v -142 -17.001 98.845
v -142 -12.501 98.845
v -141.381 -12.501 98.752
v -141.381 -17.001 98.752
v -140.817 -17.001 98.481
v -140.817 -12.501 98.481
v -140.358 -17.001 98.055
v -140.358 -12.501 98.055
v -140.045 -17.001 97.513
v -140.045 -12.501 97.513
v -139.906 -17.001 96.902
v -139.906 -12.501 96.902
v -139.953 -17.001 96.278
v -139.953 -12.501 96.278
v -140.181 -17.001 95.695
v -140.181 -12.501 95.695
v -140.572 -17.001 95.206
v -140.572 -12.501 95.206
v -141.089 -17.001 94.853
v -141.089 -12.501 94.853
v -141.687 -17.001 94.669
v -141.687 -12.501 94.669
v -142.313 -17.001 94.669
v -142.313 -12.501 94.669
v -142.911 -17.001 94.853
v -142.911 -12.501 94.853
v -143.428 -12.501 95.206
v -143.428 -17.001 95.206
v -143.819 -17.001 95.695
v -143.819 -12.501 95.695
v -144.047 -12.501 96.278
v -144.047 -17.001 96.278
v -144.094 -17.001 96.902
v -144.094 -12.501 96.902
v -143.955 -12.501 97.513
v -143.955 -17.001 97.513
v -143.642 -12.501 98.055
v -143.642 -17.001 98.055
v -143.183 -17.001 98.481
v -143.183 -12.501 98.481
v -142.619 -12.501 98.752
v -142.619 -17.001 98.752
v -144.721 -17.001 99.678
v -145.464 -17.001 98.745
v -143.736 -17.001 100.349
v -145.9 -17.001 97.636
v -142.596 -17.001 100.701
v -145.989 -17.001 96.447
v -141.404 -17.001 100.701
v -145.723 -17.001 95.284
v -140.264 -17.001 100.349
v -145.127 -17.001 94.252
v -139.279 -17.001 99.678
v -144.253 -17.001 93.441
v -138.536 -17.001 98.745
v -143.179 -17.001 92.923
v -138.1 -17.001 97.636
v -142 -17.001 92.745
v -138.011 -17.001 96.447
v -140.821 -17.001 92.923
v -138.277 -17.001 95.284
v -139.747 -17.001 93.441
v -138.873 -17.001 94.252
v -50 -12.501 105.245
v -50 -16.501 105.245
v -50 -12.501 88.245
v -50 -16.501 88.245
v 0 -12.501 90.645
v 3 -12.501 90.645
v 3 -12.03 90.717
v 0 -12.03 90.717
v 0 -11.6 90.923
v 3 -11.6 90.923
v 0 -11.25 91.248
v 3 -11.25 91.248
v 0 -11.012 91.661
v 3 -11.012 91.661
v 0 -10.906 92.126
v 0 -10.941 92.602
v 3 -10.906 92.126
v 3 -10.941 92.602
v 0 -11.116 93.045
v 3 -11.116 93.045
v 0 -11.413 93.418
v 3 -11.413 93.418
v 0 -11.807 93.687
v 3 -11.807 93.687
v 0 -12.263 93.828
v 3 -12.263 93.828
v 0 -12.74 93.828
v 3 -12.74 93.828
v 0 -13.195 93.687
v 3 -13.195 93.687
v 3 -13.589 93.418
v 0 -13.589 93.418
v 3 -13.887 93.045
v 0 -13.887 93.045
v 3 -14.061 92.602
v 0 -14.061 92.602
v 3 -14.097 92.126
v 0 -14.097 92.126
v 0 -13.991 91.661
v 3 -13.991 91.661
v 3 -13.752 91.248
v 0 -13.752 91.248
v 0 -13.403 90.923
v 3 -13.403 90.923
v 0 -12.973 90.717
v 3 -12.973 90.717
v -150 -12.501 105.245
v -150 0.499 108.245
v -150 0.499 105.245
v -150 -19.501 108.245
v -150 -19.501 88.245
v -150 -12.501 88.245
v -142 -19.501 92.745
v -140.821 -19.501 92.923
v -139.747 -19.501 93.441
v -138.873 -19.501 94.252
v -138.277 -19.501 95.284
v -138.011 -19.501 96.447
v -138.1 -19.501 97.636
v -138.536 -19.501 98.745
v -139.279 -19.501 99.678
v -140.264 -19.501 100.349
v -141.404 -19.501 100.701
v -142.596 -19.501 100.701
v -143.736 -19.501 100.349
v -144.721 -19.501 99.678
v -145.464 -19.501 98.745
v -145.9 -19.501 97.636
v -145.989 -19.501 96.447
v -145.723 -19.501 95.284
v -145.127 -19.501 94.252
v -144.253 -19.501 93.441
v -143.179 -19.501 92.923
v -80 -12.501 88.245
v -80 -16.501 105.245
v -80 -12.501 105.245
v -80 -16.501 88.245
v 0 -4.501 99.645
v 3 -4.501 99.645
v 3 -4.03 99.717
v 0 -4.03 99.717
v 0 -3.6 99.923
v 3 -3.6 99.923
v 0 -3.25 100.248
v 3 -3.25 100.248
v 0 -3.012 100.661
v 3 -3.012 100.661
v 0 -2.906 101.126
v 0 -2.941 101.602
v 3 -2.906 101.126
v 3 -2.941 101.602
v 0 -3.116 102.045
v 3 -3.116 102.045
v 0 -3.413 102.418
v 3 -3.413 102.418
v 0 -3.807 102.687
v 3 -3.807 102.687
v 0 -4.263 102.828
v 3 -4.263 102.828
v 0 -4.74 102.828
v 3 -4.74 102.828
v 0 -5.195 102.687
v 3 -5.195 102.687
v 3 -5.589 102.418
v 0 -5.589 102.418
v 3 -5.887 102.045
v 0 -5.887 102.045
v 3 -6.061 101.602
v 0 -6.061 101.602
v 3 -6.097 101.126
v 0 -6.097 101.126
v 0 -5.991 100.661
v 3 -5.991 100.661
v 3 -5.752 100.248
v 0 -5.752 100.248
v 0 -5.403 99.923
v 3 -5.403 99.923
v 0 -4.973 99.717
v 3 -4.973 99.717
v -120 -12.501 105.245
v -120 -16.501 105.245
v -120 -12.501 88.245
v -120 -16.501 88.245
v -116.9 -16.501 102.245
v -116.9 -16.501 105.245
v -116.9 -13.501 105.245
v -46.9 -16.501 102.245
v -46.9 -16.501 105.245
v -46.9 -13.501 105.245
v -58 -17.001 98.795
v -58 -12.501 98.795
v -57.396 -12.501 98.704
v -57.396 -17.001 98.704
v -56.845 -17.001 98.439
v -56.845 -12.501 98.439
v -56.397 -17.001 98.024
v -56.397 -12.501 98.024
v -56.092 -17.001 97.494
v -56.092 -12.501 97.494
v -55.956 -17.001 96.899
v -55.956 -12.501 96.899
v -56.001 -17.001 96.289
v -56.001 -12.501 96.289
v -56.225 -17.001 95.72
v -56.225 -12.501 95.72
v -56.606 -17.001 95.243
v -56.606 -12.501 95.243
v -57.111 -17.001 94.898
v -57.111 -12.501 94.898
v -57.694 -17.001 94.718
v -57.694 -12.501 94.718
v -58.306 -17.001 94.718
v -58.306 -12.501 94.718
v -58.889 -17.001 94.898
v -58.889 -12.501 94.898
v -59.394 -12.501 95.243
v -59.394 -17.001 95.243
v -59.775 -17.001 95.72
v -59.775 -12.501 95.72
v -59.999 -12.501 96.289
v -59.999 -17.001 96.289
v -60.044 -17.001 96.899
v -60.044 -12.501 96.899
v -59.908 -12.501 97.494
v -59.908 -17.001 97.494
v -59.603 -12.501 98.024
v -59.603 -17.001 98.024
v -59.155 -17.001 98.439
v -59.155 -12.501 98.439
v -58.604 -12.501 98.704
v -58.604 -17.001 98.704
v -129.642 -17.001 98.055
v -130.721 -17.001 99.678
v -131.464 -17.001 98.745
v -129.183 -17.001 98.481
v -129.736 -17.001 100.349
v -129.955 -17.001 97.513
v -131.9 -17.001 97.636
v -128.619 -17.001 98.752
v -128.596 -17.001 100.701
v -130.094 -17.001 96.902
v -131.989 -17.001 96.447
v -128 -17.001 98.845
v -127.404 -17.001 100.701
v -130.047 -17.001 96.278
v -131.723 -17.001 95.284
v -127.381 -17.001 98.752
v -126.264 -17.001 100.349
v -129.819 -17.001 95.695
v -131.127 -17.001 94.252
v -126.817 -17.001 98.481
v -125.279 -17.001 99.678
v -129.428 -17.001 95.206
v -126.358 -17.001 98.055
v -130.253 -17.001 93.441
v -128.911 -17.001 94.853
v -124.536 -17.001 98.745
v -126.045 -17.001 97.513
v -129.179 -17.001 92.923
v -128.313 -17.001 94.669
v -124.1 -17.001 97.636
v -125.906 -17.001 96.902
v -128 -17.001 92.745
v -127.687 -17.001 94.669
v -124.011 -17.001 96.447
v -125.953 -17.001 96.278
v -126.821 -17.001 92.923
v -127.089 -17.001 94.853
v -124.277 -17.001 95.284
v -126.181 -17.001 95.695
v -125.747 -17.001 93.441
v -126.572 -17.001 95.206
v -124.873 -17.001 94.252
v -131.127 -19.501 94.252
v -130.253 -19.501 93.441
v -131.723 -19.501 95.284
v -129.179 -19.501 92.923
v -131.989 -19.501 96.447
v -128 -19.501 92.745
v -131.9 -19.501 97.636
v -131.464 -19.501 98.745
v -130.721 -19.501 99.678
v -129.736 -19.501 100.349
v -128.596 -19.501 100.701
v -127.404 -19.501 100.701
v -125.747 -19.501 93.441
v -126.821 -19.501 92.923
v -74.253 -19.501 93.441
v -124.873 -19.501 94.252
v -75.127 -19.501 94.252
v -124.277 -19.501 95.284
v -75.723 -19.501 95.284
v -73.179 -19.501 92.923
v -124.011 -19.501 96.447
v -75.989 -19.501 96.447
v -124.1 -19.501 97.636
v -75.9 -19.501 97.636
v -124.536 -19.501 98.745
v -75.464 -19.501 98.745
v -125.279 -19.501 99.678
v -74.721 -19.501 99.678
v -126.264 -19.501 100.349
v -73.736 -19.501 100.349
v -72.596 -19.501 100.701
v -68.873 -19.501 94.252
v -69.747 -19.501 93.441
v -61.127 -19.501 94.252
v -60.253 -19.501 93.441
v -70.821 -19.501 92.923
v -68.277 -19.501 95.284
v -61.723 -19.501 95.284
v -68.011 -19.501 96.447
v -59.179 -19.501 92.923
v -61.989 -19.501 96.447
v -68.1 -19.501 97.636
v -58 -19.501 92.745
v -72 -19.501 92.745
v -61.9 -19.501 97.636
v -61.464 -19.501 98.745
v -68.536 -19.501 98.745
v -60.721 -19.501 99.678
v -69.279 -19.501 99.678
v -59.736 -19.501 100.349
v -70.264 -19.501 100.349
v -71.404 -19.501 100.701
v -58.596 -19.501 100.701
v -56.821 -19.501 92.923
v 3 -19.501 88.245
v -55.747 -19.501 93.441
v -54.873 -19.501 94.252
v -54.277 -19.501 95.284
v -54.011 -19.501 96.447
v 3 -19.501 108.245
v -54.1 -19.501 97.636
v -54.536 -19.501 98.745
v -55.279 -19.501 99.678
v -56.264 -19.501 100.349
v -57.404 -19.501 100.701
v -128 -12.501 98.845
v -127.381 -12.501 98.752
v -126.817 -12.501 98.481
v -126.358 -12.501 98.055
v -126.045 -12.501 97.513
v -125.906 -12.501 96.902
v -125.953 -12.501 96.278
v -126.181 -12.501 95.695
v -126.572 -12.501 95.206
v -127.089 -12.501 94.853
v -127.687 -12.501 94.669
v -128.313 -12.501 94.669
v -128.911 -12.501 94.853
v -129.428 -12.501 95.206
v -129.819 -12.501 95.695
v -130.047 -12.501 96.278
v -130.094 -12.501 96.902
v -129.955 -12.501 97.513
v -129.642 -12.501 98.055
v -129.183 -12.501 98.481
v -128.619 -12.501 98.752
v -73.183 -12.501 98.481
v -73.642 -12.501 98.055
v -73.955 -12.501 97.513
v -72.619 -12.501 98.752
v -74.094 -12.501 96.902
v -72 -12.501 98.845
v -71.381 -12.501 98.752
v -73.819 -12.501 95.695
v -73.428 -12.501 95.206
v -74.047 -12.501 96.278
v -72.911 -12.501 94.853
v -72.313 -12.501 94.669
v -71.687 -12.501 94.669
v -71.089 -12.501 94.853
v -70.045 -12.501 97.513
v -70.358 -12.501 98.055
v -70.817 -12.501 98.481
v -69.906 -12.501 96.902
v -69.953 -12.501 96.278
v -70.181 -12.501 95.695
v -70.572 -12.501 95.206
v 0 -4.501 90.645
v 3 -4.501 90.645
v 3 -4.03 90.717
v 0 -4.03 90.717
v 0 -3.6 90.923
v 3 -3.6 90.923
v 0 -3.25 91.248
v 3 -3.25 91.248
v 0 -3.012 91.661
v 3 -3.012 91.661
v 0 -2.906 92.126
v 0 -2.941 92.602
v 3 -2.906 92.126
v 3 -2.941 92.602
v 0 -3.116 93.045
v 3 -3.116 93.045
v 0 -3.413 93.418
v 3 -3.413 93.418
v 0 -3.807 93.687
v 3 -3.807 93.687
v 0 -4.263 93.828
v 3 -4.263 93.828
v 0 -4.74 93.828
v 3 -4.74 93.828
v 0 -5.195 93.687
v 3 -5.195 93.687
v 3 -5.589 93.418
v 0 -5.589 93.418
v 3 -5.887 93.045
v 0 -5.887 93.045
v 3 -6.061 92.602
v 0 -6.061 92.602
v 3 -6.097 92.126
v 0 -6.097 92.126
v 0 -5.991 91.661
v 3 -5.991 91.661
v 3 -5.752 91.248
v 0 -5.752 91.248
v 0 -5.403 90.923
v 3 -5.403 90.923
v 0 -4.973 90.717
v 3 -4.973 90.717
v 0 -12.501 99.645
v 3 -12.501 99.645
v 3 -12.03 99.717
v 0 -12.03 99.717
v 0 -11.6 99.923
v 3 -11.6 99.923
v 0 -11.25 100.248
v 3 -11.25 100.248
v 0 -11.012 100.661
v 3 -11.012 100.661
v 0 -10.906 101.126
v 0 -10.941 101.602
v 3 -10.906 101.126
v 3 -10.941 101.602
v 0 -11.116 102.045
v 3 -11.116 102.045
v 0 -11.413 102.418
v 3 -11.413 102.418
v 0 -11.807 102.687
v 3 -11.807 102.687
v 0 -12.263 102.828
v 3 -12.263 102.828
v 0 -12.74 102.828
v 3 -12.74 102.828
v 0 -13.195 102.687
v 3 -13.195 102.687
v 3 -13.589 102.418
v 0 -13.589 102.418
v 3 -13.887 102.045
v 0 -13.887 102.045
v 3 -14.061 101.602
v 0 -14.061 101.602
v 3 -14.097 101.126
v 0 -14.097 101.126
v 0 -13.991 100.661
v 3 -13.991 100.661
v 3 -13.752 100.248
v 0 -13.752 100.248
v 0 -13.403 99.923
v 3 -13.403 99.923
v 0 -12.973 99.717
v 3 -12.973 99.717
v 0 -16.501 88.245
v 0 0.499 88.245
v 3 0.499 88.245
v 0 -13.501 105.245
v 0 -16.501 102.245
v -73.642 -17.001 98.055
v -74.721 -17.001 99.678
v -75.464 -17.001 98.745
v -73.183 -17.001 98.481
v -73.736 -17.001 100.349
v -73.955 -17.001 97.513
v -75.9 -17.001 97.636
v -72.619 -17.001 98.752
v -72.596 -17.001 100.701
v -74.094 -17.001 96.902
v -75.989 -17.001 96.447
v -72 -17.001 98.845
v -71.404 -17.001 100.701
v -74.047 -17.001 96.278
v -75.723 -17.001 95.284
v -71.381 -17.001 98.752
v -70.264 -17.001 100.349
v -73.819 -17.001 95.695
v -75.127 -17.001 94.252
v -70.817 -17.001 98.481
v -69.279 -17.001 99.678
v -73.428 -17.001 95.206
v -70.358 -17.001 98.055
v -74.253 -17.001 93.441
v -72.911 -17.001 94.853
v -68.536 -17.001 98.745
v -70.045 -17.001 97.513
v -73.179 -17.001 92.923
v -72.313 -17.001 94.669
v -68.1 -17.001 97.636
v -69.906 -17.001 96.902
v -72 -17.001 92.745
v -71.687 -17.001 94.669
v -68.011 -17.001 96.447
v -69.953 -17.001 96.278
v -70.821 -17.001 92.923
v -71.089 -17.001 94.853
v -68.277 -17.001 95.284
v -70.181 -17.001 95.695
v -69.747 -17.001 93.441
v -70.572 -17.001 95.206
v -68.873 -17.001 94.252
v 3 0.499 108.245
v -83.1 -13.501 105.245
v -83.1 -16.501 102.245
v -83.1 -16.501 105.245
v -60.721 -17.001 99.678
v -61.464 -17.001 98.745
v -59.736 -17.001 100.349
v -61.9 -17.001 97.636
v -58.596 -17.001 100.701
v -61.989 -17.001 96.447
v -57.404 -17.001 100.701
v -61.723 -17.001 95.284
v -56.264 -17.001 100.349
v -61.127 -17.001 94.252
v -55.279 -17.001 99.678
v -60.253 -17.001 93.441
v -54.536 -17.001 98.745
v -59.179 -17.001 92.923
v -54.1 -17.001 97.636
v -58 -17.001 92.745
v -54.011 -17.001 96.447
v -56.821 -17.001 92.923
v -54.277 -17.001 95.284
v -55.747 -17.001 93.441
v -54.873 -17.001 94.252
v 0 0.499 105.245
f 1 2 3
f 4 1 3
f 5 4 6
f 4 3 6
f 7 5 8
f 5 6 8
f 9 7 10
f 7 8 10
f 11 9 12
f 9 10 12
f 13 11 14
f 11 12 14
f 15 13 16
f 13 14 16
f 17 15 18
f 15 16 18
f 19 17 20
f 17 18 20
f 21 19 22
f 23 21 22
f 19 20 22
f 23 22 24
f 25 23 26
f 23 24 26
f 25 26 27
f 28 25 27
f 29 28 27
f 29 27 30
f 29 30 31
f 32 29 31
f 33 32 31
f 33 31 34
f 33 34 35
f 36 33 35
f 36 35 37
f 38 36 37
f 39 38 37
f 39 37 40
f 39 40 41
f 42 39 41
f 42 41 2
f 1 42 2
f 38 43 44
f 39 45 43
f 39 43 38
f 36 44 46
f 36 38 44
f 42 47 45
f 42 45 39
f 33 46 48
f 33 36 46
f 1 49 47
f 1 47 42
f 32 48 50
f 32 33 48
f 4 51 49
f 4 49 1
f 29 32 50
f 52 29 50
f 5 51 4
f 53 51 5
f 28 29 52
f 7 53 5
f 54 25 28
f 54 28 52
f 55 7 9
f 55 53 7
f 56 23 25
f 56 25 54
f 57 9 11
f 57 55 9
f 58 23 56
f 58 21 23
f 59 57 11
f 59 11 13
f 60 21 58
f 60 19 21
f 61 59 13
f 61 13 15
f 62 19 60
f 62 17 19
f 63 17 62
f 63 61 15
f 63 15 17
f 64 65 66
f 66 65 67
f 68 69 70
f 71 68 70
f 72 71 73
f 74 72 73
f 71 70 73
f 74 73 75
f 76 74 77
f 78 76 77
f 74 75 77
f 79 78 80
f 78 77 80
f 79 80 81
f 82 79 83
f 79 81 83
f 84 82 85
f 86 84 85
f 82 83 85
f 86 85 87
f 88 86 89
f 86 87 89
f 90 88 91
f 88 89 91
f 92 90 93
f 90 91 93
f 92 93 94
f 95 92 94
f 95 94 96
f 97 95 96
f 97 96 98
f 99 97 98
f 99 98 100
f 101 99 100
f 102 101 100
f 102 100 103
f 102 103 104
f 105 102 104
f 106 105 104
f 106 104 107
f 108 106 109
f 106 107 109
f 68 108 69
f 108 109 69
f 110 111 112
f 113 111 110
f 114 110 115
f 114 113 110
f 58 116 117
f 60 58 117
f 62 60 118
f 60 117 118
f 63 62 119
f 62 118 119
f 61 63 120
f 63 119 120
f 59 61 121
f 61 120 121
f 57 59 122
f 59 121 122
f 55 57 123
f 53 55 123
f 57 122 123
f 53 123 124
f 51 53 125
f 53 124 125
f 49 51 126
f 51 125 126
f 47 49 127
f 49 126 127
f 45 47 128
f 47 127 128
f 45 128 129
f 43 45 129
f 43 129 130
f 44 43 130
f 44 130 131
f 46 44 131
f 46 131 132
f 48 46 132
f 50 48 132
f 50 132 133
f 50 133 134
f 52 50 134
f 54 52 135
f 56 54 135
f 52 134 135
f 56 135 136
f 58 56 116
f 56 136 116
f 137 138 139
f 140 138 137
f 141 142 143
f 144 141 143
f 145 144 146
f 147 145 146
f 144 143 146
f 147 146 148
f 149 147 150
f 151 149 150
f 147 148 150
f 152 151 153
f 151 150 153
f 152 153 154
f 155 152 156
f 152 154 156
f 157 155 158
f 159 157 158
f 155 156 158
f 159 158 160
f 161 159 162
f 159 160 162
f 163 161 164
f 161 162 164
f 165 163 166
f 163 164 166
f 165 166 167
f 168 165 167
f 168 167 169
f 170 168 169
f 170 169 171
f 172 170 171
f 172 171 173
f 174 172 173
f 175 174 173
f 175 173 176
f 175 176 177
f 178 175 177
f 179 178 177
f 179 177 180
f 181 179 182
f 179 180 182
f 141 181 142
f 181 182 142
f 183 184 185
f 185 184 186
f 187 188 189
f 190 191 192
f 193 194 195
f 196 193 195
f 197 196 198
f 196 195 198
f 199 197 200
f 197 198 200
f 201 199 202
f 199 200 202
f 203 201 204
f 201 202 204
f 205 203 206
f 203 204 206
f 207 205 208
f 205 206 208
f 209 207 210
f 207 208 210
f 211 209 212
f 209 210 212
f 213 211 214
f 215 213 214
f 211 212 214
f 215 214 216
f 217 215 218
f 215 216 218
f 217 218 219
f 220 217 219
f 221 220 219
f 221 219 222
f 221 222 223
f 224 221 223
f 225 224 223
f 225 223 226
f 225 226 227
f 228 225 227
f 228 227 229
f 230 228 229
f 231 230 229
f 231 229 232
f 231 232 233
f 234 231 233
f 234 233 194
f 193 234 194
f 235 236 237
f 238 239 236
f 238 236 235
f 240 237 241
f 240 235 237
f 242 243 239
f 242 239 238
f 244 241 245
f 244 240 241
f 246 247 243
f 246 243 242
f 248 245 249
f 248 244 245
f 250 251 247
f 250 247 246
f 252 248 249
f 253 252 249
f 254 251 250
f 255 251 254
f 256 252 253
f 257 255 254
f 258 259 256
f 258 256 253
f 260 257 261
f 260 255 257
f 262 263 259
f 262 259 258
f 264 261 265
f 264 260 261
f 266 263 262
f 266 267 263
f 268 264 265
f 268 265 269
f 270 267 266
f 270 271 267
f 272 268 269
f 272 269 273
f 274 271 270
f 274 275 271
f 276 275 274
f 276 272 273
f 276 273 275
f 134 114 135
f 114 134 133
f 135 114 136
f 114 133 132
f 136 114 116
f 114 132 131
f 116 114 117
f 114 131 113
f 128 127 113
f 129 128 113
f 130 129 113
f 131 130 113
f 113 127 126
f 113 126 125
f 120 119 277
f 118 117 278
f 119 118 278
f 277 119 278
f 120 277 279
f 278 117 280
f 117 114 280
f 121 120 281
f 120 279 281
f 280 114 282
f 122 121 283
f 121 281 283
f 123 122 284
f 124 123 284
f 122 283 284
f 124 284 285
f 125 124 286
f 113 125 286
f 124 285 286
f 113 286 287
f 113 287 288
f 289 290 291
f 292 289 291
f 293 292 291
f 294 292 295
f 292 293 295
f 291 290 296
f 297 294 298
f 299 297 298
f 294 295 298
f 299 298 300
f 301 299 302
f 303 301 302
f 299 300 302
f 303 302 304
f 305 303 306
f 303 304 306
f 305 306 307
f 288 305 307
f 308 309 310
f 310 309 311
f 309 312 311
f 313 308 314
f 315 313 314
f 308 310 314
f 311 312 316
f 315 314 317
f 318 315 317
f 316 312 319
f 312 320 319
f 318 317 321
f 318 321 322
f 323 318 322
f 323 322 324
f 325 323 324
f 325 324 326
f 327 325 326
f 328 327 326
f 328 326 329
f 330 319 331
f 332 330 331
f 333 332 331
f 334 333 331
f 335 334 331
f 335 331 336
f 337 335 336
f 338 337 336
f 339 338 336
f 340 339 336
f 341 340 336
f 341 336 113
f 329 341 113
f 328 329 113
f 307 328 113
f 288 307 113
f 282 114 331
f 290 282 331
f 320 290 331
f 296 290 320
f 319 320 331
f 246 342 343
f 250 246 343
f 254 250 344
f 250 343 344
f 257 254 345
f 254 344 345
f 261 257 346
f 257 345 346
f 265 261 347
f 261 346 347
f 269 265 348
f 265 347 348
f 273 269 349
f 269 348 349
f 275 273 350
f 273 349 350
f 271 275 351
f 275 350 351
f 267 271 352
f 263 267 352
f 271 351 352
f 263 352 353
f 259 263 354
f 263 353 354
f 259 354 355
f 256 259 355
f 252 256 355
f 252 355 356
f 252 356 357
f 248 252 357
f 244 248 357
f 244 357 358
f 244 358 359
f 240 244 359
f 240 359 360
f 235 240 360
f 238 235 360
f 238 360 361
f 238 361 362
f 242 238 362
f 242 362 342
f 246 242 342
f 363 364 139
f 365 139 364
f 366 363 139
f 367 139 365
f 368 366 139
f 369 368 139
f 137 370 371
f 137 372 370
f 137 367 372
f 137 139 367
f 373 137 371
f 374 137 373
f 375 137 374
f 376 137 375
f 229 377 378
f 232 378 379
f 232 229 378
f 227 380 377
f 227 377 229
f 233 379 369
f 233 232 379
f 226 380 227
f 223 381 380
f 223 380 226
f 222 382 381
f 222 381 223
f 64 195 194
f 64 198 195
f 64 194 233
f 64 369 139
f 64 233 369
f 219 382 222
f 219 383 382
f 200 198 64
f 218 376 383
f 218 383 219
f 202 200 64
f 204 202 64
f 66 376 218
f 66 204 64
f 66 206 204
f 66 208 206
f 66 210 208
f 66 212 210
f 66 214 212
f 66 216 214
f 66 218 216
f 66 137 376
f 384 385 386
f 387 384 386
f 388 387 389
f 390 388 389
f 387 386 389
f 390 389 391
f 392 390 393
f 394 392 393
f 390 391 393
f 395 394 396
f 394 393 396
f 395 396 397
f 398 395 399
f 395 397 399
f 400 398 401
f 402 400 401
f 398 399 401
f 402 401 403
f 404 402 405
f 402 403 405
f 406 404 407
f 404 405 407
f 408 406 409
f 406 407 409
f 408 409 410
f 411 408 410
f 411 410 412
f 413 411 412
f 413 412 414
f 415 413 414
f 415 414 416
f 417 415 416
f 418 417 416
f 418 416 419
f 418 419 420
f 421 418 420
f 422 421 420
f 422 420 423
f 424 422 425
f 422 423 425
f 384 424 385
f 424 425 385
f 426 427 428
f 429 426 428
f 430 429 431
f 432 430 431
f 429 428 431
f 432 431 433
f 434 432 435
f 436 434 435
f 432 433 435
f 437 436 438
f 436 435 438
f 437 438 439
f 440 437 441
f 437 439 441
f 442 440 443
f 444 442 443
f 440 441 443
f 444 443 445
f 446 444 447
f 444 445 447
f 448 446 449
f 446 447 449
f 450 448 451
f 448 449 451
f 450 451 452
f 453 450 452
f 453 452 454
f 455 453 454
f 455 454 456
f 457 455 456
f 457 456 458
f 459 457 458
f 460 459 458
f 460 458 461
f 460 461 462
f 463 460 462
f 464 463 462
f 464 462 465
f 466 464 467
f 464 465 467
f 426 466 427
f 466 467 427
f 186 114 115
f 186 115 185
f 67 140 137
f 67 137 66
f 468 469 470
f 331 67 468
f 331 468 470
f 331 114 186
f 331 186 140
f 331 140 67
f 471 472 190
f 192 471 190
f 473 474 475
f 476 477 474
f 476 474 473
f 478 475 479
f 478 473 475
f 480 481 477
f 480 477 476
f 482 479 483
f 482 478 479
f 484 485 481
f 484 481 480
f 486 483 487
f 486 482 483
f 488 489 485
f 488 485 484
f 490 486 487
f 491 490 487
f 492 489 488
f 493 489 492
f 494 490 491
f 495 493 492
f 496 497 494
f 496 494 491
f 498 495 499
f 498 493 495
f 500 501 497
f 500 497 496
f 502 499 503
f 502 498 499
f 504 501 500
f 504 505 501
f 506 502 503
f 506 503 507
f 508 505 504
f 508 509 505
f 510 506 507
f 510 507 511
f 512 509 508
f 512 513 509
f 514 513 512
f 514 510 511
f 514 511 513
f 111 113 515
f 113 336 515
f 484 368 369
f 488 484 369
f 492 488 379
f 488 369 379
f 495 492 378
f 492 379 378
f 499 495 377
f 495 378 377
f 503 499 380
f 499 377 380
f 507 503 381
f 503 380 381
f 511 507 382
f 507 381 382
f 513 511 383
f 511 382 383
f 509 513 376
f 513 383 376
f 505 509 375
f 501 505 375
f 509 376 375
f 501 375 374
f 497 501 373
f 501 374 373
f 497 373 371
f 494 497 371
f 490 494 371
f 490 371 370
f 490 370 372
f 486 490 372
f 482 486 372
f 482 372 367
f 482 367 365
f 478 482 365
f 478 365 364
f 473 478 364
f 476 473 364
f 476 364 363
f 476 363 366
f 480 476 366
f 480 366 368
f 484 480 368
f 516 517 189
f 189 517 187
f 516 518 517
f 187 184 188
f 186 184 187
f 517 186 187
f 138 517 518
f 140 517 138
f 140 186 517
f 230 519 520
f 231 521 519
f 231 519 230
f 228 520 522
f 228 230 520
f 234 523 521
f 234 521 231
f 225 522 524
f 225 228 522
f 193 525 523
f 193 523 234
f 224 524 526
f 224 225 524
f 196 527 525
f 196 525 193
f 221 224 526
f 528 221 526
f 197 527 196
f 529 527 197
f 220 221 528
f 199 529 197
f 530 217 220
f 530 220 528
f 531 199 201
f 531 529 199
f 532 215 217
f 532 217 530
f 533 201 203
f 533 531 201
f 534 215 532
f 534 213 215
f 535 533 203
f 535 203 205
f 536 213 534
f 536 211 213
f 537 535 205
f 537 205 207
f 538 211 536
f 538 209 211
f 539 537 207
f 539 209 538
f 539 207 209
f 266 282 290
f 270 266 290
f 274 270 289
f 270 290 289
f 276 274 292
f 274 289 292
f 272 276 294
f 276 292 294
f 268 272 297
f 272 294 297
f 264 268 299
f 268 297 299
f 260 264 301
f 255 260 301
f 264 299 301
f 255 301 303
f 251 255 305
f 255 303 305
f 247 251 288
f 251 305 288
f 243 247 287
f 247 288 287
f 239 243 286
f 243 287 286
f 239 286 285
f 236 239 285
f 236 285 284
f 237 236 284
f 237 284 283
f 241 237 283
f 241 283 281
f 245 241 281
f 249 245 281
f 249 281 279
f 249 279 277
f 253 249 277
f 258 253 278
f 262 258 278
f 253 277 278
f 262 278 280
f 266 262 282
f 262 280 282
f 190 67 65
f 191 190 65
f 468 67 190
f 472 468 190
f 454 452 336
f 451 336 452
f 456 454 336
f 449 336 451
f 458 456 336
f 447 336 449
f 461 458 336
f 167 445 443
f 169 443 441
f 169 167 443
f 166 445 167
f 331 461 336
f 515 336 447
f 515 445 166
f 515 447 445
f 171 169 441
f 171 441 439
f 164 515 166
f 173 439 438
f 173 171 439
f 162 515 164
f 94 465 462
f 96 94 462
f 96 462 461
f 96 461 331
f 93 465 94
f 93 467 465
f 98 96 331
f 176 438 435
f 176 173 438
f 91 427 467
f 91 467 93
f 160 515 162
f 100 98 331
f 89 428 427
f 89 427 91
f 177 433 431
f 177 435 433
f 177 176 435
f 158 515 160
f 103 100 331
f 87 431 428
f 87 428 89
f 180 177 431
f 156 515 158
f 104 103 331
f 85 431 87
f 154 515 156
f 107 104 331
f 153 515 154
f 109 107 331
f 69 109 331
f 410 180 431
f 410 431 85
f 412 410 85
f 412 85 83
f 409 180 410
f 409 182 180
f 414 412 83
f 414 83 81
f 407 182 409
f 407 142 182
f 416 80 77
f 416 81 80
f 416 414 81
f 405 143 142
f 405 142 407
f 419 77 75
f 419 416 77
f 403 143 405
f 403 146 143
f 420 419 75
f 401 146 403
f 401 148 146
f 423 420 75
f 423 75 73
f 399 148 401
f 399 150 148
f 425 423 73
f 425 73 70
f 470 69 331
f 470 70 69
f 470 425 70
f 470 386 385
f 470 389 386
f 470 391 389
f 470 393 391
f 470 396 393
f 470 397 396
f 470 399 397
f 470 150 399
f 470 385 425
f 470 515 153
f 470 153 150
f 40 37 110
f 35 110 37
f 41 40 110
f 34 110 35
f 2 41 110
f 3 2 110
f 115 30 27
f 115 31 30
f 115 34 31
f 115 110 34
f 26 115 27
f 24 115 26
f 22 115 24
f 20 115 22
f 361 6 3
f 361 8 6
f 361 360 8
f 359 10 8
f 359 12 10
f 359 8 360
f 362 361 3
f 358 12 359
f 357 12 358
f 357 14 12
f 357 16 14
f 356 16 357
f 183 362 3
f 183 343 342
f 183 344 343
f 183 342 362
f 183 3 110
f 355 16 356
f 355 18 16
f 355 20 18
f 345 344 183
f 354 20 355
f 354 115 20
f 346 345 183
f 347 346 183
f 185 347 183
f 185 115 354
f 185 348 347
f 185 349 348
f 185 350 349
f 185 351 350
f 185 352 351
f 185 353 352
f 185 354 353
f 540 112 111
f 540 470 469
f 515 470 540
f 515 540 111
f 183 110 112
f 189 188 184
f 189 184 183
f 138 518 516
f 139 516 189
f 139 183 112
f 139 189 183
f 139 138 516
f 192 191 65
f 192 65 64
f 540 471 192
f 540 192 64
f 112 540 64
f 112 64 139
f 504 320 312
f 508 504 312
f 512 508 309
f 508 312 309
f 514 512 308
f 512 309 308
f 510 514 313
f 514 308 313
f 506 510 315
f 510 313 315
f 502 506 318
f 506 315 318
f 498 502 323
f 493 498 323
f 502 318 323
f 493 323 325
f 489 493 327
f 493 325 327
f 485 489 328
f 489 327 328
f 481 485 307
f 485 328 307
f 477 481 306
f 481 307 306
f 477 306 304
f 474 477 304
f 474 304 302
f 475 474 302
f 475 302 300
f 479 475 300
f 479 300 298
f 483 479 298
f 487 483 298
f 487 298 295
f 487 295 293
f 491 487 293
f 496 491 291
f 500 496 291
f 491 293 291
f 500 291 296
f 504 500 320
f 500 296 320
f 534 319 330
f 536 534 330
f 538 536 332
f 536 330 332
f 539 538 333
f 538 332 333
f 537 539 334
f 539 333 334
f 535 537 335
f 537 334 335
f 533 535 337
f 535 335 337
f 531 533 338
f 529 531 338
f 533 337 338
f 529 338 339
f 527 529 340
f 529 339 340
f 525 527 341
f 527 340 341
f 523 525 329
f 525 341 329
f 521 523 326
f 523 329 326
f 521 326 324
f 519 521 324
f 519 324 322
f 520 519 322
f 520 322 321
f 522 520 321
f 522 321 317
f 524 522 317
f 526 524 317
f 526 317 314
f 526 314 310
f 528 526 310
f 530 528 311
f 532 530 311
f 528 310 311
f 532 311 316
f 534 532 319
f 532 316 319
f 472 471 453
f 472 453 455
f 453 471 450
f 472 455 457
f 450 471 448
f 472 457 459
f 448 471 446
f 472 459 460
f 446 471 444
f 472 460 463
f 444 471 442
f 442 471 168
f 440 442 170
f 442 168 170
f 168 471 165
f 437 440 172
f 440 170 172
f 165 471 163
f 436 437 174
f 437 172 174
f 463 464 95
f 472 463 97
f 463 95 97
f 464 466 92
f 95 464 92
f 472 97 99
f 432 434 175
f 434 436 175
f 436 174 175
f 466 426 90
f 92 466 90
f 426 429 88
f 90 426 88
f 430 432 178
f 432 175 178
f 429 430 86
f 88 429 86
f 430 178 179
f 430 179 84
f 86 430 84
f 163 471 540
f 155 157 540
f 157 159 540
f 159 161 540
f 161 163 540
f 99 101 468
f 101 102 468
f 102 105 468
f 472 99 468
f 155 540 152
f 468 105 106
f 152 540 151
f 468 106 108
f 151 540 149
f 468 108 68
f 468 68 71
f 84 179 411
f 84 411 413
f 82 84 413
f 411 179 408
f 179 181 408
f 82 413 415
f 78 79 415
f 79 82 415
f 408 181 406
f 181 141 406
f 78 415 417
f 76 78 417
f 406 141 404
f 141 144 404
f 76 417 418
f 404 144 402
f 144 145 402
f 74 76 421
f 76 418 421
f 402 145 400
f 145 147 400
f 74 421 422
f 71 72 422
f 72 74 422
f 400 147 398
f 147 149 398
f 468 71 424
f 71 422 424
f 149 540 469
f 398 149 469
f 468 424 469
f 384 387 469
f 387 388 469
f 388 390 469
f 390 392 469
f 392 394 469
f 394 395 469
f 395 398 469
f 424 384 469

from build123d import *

# Parameters (mm, degrees)
SKETCH1_W           = 20
SKETCH1_H           = 20
BOSS_EXTRUDE1_DEPTH = 3
SKETCH2_W           = 3
SKETCH2_H           = 20
BOSS_EXTRUDE2_DEPTH = 150
SKETCH3_W           = 17
SKETCH3_H           = 3
BOSS_EXTRUDE3_DEPTH = 150
SKETCH4_R           = 1.6
CUT_EXTRUDE1_DEPTH  = 3
SKETCH5_W           = 30
SKETCH5_H           = 17
BOSS_EXTRUDE4_DEPTH = 4
SKETCH6_W           = 30
SKETCH6_H           = 17
BOSS_EXTRUDE5_DEPTH = 4
SKETCH9_R           = 2.05
SKETCH9_R_2         = 2.1
CUT_EXTRUDE4_DEPTH  = 186.434844337
SKETCH10_R          = 4
CUT_EXTRUDE5_DEPTH  = 2.5
CHAMFER3_SIZE       = 3
SKETCH12_W          = 3.1
SKETCH12_H          = 17
CUT_EXTRUDE7_DEPTH  = 3


with BuildPart() as part:
    # Sketch1 → Boss-Extrude1 (new body)
    with BuildSketch(Plane(origin=(0, 0, 0), x_dir=(0, 0, -1), z_dir=(1, 0, 0))):
        with Locations((-98.245468701, -9.501201475)):
            Rectangle(SKETCH1_W, SKETCH1_H)
    extrude(amount=BOSS_EXTRUDE1_DEPTH)

    # Sketch2 → Boss-Extrude2 (add)
    with BuildSketch(Plane.ZY):
        with Locations((106.745468701, -9.501201475)):
            Rectangle(SKETCH2_W, SKETCH2_H)
    extrude(amount=BOSS_EXTRUDE2_DEPTH)

    # Sketch3 → Boss-Extrude3 (add)
    with BuildSketch(Plane.ZY):
        with Locations((96.745468701, -18.001201475)):
            Rectangle(SKETCH3_W, SKETCH3_H)
    extrude(amount=BOSS_EXTRUDE3_DEPTH)

    # Sketch4 → Cut-Extrude1 (cut)
    with BuildSketch(Plane(origin=(3, 0, 0), x_dir=(0, 0, -1), z_dir=(1, 0, 0))):
        with Locations((-101.245468701, -4.501201475)):
            Circle(SKETCH4_R)
        with Locations((-92.245468701, -4.501201475)):
            Circle(SKETCH4_R)
        with Locations((-92.245468701, -12.501201475)):
            Circle(SKETCH4_R)
        with Locations((-101.245468701, -12.501201475)):
            Circle(SKETCH4_R)
    extrude(amount=-CUT_EXTRUDE1_DEPTH, mode=Mode.SUBTRACT)

    # Sketch5 → Boss-Extrude4 (add)
    with BuildSketch(Plane(origin=(0, -16.501201475, 0), x_dir=(1, 0, 0), z_dir=(0, 1, 0))):
        with Locations((-135, -96.745468701)):
            Rectangle(SKETCH5_W, SKETCH5_H)
    extrude(amount=BOSS_EXTRUDE4_DEPTH)

    # Sketch6 → Boss-Extrude5 (add)
    with BuildSketch(Plane(origin=(0, -16.501201475, 0), x_dir=(1, 0, 0), z_dir=(0, 1, 0))):
        with Locations((-65, -96.745468701)):
            Rectangle(SKETCH6_W, SKETCH6_H)
    extrude(amount=BOSS_EXTRUDE5_DEPTH)

    # Sketch9 → Cut-Extrude4 (cut, through all)
    with BuildSketch(Plane(origin=(0, -12.501201475, 0), x_dir=(1, 0, 0), z_dir=(0, 1, 0))):
        with Locations(Location((-58, -96.745468701, 0), (0, 0, 270))):
            Circle(SKETCH9_R)
        with Locations(Location((-72, -96.745468701, 0), (0, 0, 270))):
            Circle(SKETCH9_R_2)
        with Locations(Location((-128, -96.745468701, 0), (0, 0, 270))):
            Circle(SKETCH9_R_2)
        with Locations(Location((-142, -96.745468701, 0), (0, 0, 270))):
            Circle(SKETCH9_R_2)
    extrude(amount=-CUT_EXTRUDE4_DEPTH, mode=Mode.SUBTRACT)

    # Sketch10 → Cut-Extrude5 (cut)
    with BuildSketch(Plane.XZ.offset(19.501201475)):
        with Locations(Location((-142, 96.745468701, 0), (0, 0, 270))):
            Circle(SKETCH10_R)
        with Locations(Location((-128, 96.745468701, 0), (0, 0, 270))):
            Circle(SKETCH10_R)
        with Locations(Location((-72, 96.745468701, 0), (0, 0, 270))):
            Circle(SKETCH10_R)
        with Locations(Location((-58, 96.745468701, 0), (0, 0, 270))):
            Circle(SKETCH10_R)
    extrude(amount=-CUT_EXTRUDE5_DEPTH, mode=Mode.SUBTRACT)

    # Chamfer3
    chamfer3_edges = [part.edges().sort_by_distance(p)[0] for p in [
        (-100, -16.501201475, 105.245468701),
        (-25, -16.501201475, 105.245468701),
    ]]
    chamfer(chamfer3_edges, length=CHAMFER3_SIZE)

    # Sketch12 → Cut-Extrude7 (cut)
    with BuildSketch(Plane(origin=(0, -16.501201475, 0), x_dir=(1, 0, 0), z_dir=(0, 1, 0))):
        with Locations((-118.45, -96.745468701)):
            Rectangle(SKETCH12_W, SKETCH12_H)
        with Locations((-81.55, -96.745468701)):
            Rectangle(SKETCH12_W, SKETCH12_H)
        with Locations((-48.45, -96.745468701)):
            Rectangle(SKETCH12_W, SKETCH12_H)
    extrude(amount=CUT_EXTRUDE7_DEPTH, mode=Mode.SUBTRACT)


solid = part.part
